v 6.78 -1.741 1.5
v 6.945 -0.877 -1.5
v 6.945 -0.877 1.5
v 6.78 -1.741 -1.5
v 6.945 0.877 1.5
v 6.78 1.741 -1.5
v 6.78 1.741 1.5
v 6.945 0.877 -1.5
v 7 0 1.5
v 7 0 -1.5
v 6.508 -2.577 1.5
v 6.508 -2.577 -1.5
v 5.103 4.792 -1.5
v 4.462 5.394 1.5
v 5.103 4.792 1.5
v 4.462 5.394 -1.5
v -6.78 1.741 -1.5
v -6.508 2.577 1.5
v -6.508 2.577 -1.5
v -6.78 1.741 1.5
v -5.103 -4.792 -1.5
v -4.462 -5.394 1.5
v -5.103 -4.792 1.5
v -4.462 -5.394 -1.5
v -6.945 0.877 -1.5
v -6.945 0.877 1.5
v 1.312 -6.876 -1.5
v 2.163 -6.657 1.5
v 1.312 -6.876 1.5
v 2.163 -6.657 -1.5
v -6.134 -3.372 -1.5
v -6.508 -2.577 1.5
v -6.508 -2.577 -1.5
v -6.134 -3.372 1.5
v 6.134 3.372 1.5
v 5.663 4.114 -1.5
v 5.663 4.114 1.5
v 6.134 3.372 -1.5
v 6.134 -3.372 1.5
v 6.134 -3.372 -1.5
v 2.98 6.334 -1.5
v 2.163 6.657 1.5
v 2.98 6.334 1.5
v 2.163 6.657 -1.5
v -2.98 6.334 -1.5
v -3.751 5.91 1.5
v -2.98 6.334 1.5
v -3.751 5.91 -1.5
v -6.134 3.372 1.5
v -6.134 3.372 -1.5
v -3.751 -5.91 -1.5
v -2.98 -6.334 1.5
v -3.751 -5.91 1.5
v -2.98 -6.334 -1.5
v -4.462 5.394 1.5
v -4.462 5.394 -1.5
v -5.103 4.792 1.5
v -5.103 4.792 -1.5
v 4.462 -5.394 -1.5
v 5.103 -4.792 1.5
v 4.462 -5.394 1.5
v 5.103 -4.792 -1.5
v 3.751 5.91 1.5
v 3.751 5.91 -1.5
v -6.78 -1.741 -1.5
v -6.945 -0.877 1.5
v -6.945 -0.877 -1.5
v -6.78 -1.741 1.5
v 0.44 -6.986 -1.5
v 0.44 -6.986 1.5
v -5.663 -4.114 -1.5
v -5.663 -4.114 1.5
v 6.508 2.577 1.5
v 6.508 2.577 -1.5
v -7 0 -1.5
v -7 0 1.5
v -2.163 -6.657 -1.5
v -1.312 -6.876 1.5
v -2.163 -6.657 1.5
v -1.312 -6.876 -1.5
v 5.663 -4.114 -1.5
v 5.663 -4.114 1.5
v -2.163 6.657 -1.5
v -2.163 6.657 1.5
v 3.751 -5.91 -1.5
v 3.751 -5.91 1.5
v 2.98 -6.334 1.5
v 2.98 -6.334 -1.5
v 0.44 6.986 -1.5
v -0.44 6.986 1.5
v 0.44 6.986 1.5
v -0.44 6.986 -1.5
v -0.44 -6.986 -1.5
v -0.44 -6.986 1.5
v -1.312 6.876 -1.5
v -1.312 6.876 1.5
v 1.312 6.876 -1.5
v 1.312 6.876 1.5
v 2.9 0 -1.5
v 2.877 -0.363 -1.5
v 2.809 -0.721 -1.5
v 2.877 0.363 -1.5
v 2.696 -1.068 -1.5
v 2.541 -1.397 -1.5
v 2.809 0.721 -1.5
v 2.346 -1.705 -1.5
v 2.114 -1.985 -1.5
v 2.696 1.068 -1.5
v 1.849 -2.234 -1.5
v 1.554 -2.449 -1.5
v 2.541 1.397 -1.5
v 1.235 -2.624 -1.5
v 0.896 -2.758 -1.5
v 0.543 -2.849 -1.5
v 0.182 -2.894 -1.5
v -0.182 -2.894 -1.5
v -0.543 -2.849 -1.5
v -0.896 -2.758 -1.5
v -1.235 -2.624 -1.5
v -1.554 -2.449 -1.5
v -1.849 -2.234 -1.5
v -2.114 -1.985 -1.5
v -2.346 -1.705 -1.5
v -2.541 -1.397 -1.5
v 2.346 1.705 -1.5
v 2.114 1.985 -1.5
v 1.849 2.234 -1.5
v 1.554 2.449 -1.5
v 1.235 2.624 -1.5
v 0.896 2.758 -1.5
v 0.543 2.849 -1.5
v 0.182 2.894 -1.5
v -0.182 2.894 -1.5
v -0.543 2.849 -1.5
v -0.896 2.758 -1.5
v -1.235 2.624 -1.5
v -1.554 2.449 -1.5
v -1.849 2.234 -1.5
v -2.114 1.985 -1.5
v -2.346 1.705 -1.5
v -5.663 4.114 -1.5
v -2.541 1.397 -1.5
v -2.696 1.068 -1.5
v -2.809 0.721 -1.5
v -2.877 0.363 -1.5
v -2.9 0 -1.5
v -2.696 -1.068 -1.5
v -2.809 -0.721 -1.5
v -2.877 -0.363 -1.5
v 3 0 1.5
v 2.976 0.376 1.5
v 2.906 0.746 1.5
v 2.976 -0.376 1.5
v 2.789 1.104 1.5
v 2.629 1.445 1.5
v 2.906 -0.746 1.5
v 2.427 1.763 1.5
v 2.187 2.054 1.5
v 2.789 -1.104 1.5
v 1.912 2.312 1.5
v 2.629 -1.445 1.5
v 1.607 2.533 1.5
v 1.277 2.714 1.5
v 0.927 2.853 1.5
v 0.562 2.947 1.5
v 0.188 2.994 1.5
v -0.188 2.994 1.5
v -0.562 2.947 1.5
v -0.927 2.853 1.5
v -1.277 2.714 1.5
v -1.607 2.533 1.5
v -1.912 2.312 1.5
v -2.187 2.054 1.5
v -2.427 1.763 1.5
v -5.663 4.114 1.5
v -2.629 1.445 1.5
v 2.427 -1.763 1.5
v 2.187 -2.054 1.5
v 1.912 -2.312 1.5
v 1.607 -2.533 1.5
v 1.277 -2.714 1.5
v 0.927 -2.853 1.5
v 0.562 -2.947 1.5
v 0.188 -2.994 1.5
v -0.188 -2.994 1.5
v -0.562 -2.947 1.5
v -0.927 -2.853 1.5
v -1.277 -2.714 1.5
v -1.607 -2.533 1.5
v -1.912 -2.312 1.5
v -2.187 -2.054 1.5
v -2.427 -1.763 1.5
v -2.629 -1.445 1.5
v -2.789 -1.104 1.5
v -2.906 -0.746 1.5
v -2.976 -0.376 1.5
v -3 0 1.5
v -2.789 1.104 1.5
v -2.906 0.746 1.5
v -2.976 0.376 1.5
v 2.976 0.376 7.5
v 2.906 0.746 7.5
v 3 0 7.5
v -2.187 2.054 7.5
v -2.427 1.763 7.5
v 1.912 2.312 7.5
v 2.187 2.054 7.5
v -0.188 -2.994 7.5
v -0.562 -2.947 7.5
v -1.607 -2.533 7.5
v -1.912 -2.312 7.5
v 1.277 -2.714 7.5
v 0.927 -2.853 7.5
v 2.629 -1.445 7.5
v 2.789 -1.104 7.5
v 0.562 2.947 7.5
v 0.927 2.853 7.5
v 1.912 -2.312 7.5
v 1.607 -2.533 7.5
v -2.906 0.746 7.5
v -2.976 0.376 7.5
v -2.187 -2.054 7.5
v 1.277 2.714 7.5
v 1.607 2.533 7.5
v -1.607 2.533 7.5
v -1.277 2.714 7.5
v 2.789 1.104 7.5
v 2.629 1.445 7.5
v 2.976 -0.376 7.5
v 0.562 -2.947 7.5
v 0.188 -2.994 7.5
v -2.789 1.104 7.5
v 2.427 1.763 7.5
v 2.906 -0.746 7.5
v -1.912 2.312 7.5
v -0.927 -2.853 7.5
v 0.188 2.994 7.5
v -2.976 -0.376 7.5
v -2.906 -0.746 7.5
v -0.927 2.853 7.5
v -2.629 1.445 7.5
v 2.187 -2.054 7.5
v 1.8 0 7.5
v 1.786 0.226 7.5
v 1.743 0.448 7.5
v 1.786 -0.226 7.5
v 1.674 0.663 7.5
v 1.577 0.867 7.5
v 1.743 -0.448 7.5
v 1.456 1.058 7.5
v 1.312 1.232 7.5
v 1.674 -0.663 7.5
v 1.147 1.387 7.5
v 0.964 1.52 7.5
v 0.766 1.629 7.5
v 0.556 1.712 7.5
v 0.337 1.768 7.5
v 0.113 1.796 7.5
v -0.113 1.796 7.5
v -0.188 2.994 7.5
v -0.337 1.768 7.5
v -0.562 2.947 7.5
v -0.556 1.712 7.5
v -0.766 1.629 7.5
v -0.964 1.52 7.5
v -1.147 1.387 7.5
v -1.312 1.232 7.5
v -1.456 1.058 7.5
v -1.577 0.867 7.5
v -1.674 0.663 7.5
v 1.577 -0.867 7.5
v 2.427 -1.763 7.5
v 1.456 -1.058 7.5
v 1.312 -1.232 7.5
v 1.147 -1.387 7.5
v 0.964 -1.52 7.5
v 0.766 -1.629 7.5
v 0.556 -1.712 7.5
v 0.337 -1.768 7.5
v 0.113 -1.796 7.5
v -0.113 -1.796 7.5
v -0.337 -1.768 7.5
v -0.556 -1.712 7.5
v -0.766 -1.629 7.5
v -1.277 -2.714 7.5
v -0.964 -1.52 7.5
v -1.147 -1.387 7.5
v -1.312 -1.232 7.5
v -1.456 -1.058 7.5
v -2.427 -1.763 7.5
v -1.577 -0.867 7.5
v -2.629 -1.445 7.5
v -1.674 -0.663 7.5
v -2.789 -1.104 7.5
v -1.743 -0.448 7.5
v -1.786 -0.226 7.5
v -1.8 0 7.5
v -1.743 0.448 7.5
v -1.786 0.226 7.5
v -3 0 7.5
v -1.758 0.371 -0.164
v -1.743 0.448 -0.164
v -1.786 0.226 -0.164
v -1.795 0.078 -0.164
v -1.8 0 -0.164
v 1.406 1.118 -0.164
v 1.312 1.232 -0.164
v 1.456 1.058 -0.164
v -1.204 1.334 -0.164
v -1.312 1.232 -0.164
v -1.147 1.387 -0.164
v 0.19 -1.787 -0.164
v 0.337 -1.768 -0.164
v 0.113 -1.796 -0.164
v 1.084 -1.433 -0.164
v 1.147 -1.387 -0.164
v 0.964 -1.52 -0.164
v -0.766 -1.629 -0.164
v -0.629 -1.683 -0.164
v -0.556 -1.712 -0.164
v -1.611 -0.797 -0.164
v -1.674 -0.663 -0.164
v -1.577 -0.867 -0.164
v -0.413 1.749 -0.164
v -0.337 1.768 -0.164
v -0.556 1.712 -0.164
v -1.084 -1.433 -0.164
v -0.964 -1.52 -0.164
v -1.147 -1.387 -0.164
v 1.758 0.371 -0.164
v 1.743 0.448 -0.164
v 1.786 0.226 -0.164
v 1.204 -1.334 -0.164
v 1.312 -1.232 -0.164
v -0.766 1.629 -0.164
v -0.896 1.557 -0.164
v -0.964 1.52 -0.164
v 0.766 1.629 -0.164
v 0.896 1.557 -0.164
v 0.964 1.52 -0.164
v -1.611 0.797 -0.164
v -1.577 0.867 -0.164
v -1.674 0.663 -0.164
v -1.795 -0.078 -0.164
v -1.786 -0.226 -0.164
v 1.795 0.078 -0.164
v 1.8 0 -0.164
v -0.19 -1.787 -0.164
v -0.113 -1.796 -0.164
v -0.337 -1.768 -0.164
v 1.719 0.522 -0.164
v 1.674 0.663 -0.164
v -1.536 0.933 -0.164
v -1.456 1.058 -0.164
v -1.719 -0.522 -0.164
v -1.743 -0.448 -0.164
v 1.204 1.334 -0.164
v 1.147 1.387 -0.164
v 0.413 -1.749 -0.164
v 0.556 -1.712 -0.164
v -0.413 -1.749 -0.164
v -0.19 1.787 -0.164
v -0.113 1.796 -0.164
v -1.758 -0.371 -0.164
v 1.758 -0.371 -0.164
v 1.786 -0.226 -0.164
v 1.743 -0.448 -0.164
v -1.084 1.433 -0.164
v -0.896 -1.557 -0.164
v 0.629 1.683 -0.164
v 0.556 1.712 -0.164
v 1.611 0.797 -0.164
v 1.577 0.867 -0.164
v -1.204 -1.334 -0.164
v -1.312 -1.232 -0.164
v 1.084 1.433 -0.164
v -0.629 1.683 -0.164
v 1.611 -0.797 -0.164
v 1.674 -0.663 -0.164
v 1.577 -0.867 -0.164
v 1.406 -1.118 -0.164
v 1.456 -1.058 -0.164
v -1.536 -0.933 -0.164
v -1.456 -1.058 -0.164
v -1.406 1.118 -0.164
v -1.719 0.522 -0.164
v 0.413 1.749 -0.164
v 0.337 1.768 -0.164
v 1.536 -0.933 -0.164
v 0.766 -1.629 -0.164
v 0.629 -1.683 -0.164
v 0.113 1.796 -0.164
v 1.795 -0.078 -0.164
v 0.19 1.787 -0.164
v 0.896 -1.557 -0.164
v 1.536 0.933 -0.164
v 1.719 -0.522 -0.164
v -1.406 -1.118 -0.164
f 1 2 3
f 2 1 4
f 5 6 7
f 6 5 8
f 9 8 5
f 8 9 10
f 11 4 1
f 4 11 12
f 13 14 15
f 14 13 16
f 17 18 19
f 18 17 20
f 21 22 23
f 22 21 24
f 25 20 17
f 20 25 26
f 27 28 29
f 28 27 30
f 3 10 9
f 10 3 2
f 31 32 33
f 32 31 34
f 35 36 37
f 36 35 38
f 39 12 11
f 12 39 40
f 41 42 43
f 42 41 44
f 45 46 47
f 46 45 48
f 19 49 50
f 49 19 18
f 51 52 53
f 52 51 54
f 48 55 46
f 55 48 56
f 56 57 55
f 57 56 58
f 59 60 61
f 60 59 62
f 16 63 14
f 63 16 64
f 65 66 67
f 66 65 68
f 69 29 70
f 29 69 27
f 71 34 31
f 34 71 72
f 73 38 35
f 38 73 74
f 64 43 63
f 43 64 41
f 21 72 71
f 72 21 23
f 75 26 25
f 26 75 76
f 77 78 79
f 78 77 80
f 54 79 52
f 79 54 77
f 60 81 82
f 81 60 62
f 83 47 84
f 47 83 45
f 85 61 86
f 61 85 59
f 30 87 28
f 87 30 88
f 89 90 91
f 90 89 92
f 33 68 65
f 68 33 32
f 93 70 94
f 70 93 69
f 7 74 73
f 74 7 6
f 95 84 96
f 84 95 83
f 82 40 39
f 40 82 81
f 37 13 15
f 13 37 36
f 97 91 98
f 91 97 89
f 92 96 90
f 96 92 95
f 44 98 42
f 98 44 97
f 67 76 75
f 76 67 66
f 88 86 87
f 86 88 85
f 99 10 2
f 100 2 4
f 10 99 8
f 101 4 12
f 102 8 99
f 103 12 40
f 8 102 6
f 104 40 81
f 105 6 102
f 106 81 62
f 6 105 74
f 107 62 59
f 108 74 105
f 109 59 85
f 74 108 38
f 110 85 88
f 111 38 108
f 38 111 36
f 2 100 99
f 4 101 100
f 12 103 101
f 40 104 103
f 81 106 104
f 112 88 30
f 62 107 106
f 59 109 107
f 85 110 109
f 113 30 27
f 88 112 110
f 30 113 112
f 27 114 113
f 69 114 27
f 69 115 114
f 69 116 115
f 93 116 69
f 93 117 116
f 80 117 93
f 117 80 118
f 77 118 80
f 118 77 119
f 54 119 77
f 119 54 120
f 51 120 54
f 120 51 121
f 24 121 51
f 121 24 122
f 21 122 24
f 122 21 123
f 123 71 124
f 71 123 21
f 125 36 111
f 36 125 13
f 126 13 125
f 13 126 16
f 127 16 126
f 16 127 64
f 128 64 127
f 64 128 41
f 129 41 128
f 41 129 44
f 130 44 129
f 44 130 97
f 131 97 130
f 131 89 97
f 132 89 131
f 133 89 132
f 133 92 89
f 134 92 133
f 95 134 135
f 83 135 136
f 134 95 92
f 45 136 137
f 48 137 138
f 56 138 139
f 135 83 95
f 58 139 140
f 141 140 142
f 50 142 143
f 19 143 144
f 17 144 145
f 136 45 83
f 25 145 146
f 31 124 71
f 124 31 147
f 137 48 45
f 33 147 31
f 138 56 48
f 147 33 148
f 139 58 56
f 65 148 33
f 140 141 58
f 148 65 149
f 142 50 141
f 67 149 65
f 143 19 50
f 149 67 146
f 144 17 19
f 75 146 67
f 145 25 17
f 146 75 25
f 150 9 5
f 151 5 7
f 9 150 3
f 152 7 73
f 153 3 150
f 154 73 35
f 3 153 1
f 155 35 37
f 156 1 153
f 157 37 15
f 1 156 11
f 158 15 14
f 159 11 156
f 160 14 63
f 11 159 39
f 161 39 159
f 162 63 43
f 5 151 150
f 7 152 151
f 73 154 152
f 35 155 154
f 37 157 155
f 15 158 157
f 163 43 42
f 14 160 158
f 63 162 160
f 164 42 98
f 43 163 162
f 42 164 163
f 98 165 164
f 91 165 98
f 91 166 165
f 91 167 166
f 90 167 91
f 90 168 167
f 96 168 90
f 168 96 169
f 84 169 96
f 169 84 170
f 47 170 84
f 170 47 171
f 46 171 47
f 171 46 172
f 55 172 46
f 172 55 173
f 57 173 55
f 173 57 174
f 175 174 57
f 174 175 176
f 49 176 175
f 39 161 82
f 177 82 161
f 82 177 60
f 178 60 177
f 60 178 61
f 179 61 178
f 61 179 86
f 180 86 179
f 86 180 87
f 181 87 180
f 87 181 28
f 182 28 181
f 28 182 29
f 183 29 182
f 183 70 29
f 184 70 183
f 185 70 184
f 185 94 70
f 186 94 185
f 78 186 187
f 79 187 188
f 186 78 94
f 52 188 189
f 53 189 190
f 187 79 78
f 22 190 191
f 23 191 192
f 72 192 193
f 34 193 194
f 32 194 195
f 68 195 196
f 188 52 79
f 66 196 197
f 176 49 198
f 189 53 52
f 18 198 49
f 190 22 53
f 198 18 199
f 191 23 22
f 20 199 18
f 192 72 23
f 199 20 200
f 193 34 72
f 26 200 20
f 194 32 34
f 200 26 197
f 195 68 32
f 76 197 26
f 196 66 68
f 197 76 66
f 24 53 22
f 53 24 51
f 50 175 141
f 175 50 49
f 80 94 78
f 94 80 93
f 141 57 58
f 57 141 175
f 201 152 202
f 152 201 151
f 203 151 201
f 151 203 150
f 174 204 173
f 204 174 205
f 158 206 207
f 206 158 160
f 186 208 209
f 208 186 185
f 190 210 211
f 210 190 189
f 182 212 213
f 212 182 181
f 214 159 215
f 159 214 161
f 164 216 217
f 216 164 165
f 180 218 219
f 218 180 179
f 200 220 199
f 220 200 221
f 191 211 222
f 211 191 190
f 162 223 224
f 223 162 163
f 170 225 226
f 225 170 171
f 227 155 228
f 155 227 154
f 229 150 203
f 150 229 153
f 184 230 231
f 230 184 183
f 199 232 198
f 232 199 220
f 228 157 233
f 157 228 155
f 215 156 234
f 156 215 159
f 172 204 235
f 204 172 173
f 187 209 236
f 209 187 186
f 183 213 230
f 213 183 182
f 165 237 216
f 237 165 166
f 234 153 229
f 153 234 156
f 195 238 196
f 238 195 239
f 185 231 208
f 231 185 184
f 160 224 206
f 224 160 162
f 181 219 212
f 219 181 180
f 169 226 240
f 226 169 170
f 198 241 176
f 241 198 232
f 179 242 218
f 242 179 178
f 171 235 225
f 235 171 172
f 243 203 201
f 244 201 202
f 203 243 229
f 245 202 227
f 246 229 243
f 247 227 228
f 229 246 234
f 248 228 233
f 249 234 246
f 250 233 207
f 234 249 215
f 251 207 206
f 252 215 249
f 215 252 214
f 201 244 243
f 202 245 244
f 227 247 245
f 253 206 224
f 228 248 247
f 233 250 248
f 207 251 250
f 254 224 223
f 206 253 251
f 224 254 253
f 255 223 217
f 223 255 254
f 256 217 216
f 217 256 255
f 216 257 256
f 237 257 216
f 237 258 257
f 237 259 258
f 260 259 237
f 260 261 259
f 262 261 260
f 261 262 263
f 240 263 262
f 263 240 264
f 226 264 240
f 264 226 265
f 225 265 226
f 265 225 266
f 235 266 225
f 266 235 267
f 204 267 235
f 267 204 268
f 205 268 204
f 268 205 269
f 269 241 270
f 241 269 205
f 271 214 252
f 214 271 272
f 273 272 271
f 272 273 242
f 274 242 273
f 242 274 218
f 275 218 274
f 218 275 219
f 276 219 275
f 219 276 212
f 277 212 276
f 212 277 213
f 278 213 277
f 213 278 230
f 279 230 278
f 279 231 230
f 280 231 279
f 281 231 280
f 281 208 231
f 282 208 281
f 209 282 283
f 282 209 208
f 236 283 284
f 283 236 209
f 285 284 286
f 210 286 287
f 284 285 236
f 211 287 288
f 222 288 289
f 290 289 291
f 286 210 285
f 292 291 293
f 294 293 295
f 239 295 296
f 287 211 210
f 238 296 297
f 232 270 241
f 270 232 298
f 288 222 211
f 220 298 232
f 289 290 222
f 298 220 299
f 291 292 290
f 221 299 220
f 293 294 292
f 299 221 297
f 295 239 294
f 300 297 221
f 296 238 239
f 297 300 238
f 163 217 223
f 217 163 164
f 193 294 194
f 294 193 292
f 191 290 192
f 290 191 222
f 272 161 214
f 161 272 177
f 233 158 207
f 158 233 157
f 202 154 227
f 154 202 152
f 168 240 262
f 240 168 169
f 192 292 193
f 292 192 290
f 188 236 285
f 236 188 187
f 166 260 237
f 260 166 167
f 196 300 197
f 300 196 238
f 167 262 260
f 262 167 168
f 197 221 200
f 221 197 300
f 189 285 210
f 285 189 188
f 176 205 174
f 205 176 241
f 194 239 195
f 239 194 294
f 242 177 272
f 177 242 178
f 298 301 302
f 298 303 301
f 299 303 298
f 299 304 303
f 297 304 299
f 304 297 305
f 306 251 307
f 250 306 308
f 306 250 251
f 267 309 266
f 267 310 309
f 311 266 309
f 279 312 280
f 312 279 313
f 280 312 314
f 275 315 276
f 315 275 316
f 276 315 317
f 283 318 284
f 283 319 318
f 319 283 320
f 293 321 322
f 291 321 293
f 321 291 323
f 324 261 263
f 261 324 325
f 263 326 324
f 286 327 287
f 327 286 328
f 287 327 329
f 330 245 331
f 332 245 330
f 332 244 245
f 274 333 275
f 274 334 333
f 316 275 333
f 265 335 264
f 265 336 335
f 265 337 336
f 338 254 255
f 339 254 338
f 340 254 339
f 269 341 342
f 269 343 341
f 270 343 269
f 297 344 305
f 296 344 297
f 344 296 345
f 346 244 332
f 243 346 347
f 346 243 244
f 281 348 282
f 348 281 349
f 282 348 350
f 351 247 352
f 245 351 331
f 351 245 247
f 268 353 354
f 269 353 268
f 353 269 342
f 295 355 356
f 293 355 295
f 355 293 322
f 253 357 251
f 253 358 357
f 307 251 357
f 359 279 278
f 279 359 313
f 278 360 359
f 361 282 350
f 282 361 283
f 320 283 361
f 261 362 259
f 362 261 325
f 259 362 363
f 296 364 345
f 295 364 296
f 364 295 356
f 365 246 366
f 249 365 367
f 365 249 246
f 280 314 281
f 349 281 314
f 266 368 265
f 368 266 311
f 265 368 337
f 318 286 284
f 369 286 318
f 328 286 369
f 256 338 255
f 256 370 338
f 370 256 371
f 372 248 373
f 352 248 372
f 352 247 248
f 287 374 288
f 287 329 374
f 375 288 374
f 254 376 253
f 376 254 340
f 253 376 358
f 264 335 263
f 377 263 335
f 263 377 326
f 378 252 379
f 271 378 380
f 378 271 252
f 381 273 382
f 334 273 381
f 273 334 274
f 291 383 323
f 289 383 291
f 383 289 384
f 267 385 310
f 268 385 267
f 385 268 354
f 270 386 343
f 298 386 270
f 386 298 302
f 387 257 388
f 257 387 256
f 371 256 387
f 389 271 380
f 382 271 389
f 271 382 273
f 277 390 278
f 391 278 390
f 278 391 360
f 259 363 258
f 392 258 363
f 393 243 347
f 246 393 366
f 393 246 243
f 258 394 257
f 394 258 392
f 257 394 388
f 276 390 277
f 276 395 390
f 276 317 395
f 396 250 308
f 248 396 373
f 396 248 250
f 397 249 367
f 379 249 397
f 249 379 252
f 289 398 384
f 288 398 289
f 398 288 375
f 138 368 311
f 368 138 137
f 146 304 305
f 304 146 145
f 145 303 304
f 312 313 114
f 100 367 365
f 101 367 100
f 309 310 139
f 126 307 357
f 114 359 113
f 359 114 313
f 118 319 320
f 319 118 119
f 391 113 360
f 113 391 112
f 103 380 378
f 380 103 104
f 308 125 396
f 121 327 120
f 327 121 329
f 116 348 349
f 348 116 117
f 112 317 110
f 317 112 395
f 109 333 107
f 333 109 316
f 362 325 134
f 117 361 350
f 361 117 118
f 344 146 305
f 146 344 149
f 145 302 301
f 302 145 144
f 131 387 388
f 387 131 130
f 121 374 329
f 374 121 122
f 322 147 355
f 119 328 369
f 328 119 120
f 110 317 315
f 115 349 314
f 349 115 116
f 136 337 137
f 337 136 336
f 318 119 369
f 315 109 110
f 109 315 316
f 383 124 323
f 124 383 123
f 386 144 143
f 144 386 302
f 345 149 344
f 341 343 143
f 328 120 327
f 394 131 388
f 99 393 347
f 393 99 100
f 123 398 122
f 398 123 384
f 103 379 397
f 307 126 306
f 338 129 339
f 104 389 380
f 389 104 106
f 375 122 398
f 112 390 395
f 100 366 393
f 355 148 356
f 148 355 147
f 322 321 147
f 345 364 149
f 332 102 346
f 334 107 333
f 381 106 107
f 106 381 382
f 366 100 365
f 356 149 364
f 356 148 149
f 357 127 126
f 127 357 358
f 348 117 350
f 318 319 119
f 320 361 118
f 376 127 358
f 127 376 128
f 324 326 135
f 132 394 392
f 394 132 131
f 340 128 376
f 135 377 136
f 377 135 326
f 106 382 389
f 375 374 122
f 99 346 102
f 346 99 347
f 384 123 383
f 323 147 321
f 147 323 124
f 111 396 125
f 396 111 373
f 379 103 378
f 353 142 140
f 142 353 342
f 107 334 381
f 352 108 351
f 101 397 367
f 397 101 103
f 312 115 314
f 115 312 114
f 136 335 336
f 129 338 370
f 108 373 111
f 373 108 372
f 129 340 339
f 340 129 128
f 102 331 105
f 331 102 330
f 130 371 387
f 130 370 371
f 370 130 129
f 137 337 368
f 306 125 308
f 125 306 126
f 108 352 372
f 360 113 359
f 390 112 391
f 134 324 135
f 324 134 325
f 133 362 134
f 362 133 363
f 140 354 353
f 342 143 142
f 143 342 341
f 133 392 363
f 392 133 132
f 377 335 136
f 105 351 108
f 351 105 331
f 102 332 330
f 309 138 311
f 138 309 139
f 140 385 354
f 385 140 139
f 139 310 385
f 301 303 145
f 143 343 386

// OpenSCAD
$fn = 50;


difference() {
	union() {
		translate(v = [0, 0, -1.5000000000]) {
			cylinder(h = 3, r = 7.0000000000);
		}
		translate(v = [0, 0, -1.5000000000]) {
			cylinder(h = 9, r = 3.0000000000);
		}
	}
	union() {
		translate(v = [0, 0, -1.5000000000]) {
			rotate(a = [0, 180, 0]) {
				difference() {
					union() {
						translate(v = [0, 0, -9.0000000000]) {
							cylinder(h = 9, r = 1.5000000000);
						}
						translate(v = [0, 0, -9.0000000000]) {
							cylinder(h = 9, r = 1.8000000000);
						}
						translate(v = [0, 0, -1.7000000000]) {
							cylinder(h = 1.7000000000, r1 = 1.5000000000, r2 = 2.9000000000);
						}
						translate(v = [0, 0, -9.0000000000]) {
							cylinder(h = 9, r = 1.5000000000);
						}
					}
					union();
				}
			}
		}
		translate(v = [0, 0, -100.0000000000]) {
			cylinder(h = 200, r = 1.5000000000);
		}
	}
}
